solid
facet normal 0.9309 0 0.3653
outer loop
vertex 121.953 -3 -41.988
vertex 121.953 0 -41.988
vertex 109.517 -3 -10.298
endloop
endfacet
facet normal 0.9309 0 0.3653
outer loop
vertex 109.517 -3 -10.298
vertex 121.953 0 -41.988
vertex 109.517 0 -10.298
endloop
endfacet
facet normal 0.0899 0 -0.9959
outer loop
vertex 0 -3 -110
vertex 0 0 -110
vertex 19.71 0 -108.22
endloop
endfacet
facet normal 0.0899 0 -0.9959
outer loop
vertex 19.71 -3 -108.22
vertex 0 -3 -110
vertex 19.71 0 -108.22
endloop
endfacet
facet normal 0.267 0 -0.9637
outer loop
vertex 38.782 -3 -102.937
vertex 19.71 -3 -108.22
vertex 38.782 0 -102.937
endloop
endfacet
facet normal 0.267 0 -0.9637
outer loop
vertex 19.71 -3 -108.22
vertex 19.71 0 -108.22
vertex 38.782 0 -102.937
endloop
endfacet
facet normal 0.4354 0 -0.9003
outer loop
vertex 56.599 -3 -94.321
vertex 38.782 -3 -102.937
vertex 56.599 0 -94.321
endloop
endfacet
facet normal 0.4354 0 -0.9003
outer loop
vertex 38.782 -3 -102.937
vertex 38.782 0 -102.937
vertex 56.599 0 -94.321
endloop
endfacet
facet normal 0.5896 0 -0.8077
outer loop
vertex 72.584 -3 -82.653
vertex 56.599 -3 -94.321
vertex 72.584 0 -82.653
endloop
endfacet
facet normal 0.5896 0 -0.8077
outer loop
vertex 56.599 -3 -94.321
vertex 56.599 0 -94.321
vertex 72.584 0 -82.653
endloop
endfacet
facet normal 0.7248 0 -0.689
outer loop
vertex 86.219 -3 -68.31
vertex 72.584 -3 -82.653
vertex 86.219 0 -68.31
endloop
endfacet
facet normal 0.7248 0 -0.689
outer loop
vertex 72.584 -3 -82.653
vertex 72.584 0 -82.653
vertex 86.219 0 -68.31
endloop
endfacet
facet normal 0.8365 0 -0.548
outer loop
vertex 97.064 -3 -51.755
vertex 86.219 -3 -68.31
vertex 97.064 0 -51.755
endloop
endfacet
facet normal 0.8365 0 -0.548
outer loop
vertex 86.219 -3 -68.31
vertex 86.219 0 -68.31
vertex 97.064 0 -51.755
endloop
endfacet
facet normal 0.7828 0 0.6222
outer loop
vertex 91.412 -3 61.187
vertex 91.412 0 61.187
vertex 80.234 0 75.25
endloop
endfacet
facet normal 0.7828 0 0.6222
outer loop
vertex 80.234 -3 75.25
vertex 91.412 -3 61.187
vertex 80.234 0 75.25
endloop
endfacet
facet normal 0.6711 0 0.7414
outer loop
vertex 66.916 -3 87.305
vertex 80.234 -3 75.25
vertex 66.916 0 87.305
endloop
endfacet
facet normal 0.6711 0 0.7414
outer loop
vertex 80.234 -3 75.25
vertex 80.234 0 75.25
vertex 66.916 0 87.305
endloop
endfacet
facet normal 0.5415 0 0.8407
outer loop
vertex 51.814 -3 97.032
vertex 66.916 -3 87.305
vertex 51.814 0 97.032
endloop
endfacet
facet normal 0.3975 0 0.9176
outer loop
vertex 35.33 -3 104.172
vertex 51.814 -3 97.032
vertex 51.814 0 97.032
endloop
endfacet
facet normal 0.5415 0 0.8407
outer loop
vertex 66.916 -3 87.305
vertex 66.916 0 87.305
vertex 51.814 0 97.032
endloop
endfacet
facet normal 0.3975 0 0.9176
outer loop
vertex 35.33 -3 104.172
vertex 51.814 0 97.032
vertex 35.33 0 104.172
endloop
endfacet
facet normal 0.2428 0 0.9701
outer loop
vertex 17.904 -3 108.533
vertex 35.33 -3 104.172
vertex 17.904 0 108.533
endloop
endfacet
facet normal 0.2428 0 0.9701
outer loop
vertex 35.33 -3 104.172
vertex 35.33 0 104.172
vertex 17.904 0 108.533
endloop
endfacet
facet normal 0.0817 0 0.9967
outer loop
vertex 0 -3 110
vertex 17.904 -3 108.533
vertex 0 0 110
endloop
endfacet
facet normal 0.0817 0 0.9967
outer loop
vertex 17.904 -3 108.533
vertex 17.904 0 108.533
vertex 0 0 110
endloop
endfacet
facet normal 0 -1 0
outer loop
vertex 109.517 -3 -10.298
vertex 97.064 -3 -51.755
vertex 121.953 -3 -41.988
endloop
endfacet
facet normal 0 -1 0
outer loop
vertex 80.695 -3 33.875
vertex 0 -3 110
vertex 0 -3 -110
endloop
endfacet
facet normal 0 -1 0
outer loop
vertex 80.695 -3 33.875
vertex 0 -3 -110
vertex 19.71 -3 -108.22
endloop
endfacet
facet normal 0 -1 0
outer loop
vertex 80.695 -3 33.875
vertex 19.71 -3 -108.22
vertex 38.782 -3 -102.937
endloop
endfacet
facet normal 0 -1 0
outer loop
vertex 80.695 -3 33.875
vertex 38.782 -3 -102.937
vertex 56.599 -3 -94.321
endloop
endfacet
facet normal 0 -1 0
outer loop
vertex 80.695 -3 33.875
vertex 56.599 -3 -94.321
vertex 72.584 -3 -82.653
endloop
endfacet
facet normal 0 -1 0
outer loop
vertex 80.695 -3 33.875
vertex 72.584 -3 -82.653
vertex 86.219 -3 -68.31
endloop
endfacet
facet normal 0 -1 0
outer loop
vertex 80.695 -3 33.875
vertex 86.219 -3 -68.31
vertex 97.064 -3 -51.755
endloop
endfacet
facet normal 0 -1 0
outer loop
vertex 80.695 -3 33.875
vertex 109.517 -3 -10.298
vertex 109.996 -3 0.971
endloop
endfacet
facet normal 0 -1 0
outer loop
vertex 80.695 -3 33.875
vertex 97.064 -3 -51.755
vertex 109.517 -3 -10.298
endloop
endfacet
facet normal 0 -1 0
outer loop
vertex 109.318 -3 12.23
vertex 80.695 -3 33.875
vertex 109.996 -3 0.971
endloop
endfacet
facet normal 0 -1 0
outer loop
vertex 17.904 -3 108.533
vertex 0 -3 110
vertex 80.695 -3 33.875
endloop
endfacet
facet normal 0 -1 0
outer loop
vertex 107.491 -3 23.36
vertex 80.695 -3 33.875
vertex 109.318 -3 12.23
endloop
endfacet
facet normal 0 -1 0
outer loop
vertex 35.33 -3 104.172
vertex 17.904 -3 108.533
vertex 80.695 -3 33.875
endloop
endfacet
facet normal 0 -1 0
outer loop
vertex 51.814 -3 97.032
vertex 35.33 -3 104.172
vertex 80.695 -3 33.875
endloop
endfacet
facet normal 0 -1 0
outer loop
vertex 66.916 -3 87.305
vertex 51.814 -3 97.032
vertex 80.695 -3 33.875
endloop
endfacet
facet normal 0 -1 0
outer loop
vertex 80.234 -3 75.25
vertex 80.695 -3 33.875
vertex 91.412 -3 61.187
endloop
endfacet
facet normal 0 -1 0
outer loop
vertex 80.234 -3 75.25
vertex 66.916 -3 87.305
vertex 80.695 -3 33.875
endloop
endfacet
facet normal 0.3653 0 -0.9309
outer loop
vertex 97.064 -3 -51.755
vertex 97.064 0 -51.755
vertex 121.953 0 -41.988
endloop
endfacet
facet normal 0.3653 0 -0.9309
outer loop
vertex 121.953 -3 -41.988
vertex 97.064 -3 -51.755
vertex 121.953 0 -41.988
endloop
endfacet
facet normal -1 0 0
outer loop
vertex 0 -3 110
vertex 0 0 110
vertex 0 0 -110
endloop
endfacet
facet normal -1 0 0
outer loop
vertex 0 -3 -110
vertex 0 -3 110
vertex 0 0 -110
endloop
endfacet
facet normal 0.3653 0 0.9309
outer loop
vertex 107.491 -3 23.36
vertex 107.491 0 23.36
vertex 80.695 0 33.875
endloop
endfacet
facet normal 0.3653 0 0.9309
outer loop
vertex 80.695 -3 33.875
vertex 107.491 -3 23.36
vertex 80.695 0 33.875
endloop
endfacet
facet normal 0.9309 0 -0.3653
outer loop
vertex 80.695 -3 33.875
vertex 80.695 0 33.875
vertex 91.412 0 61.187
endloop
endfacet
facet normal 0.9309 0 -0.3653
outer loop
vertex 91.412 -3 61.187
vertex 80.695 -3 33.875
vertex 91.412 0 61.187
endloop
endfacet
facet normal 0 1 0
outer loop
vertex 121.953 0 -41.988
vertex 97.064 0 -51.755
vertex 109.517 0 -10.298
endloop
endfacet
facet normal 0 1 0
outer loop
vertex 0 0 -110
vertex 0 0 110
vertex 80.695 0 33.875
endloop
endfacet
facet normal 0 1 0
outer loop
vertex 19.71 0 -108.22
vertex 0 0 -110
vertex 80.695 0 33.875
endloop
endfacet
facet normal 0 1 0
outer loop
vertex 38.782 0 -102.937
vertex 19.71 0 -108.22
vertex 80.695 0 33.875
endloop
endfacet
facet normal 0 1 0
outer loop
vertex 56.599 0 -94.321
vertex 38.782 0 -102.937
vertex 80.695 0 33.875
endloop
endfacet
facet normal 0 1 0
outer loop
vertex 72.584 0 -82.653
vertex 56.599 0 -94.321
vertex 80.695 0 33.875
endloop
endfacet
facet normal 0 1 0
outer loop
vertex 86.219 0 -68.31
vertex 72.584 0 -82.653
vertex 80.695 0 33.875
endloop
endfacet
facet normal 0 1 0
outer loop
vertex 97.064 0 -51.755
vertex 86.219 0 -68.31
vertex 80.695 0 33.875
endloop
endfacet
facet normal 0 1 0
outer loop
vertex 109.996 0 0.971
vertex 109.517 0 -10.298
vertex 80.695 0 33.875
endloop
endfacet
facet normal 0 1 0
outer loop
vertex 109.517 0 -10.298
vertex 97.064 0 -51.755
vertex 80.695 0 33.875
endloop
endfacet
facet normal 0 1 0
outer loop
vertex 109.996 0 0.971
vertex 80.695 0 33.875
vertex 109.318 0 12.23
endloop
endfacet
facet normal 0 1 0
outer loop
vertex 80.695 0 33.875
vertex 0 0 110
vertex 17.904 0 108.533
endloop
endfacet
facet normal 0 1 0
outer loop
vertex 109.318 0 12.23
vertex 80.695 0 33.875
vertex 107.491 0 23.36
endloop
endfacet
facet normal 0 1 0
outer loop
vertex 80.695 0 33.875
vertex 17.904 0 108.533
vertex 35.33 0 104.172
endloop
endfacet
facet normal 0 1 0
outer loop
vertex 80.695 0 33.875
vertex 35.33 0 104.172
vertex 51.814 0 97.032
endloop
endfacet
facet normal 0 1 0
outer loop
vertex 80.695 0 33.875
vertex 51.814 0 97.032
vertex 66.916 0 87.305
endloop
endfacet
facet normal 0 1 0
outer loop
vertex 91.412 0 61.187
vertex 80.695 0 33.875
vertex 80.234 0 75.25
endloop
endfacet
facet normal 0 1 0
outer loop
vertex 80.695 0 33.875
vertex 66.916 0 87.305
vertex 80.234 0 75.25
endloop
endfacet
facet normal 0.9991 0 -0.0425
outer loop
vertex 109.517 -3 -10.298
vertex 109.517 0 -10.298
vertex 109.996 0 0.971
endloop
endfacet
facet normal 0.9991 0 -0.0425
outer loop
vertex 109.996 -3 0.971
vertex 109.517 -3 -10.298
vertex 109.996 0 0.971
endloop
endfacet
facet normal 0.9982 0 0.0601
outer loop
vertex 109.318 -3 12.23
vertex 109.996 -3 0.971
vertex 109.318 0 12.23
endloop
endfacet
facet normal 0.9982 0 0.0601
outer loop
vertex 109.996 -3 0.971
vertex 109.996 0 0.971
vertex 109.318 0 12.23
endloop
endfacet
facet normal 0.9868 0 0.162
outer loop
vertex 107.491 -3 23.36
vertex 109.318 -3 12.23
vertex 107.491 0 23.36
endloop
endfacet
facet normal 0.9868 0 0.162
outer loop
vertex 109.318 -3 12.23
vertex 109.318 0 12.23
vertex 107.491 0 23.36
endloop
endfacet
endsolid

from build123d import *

# Parameters (mm, degrees)
F1_DEPTH = 3


with BuildPart() as f1:
    # F0 (on Front) → F1 (new body)
    with BuildSketch(Plane.XZ):
        with BuildLine():
            Line((0, 110), (0, -110))
            ThreePointArc((0, -110), (56.599092, -94.321486), (97.063827, -51.755323))
            Line((97.063827, -51.755323), (121.953153, -41.987608))
            Line((121.953153, -41.987608), (109.51686, -10.298421))
            ThreePointArc((109.51686, -10.298421), (109.801283, 6.608946), (107.490949, 23.360135))
            Line((107.490949, 23.360135), (80.694538, 33.874987))
            Line((80.694538, 33.874987), (91.411813, 61.187258))
            ThreePointArc((91.411813, 61.187258), (51.814099, 97.032465), (0, 110))
        make_face()
    extrude(amount=F1_DEPTH)


solid = f1.part
